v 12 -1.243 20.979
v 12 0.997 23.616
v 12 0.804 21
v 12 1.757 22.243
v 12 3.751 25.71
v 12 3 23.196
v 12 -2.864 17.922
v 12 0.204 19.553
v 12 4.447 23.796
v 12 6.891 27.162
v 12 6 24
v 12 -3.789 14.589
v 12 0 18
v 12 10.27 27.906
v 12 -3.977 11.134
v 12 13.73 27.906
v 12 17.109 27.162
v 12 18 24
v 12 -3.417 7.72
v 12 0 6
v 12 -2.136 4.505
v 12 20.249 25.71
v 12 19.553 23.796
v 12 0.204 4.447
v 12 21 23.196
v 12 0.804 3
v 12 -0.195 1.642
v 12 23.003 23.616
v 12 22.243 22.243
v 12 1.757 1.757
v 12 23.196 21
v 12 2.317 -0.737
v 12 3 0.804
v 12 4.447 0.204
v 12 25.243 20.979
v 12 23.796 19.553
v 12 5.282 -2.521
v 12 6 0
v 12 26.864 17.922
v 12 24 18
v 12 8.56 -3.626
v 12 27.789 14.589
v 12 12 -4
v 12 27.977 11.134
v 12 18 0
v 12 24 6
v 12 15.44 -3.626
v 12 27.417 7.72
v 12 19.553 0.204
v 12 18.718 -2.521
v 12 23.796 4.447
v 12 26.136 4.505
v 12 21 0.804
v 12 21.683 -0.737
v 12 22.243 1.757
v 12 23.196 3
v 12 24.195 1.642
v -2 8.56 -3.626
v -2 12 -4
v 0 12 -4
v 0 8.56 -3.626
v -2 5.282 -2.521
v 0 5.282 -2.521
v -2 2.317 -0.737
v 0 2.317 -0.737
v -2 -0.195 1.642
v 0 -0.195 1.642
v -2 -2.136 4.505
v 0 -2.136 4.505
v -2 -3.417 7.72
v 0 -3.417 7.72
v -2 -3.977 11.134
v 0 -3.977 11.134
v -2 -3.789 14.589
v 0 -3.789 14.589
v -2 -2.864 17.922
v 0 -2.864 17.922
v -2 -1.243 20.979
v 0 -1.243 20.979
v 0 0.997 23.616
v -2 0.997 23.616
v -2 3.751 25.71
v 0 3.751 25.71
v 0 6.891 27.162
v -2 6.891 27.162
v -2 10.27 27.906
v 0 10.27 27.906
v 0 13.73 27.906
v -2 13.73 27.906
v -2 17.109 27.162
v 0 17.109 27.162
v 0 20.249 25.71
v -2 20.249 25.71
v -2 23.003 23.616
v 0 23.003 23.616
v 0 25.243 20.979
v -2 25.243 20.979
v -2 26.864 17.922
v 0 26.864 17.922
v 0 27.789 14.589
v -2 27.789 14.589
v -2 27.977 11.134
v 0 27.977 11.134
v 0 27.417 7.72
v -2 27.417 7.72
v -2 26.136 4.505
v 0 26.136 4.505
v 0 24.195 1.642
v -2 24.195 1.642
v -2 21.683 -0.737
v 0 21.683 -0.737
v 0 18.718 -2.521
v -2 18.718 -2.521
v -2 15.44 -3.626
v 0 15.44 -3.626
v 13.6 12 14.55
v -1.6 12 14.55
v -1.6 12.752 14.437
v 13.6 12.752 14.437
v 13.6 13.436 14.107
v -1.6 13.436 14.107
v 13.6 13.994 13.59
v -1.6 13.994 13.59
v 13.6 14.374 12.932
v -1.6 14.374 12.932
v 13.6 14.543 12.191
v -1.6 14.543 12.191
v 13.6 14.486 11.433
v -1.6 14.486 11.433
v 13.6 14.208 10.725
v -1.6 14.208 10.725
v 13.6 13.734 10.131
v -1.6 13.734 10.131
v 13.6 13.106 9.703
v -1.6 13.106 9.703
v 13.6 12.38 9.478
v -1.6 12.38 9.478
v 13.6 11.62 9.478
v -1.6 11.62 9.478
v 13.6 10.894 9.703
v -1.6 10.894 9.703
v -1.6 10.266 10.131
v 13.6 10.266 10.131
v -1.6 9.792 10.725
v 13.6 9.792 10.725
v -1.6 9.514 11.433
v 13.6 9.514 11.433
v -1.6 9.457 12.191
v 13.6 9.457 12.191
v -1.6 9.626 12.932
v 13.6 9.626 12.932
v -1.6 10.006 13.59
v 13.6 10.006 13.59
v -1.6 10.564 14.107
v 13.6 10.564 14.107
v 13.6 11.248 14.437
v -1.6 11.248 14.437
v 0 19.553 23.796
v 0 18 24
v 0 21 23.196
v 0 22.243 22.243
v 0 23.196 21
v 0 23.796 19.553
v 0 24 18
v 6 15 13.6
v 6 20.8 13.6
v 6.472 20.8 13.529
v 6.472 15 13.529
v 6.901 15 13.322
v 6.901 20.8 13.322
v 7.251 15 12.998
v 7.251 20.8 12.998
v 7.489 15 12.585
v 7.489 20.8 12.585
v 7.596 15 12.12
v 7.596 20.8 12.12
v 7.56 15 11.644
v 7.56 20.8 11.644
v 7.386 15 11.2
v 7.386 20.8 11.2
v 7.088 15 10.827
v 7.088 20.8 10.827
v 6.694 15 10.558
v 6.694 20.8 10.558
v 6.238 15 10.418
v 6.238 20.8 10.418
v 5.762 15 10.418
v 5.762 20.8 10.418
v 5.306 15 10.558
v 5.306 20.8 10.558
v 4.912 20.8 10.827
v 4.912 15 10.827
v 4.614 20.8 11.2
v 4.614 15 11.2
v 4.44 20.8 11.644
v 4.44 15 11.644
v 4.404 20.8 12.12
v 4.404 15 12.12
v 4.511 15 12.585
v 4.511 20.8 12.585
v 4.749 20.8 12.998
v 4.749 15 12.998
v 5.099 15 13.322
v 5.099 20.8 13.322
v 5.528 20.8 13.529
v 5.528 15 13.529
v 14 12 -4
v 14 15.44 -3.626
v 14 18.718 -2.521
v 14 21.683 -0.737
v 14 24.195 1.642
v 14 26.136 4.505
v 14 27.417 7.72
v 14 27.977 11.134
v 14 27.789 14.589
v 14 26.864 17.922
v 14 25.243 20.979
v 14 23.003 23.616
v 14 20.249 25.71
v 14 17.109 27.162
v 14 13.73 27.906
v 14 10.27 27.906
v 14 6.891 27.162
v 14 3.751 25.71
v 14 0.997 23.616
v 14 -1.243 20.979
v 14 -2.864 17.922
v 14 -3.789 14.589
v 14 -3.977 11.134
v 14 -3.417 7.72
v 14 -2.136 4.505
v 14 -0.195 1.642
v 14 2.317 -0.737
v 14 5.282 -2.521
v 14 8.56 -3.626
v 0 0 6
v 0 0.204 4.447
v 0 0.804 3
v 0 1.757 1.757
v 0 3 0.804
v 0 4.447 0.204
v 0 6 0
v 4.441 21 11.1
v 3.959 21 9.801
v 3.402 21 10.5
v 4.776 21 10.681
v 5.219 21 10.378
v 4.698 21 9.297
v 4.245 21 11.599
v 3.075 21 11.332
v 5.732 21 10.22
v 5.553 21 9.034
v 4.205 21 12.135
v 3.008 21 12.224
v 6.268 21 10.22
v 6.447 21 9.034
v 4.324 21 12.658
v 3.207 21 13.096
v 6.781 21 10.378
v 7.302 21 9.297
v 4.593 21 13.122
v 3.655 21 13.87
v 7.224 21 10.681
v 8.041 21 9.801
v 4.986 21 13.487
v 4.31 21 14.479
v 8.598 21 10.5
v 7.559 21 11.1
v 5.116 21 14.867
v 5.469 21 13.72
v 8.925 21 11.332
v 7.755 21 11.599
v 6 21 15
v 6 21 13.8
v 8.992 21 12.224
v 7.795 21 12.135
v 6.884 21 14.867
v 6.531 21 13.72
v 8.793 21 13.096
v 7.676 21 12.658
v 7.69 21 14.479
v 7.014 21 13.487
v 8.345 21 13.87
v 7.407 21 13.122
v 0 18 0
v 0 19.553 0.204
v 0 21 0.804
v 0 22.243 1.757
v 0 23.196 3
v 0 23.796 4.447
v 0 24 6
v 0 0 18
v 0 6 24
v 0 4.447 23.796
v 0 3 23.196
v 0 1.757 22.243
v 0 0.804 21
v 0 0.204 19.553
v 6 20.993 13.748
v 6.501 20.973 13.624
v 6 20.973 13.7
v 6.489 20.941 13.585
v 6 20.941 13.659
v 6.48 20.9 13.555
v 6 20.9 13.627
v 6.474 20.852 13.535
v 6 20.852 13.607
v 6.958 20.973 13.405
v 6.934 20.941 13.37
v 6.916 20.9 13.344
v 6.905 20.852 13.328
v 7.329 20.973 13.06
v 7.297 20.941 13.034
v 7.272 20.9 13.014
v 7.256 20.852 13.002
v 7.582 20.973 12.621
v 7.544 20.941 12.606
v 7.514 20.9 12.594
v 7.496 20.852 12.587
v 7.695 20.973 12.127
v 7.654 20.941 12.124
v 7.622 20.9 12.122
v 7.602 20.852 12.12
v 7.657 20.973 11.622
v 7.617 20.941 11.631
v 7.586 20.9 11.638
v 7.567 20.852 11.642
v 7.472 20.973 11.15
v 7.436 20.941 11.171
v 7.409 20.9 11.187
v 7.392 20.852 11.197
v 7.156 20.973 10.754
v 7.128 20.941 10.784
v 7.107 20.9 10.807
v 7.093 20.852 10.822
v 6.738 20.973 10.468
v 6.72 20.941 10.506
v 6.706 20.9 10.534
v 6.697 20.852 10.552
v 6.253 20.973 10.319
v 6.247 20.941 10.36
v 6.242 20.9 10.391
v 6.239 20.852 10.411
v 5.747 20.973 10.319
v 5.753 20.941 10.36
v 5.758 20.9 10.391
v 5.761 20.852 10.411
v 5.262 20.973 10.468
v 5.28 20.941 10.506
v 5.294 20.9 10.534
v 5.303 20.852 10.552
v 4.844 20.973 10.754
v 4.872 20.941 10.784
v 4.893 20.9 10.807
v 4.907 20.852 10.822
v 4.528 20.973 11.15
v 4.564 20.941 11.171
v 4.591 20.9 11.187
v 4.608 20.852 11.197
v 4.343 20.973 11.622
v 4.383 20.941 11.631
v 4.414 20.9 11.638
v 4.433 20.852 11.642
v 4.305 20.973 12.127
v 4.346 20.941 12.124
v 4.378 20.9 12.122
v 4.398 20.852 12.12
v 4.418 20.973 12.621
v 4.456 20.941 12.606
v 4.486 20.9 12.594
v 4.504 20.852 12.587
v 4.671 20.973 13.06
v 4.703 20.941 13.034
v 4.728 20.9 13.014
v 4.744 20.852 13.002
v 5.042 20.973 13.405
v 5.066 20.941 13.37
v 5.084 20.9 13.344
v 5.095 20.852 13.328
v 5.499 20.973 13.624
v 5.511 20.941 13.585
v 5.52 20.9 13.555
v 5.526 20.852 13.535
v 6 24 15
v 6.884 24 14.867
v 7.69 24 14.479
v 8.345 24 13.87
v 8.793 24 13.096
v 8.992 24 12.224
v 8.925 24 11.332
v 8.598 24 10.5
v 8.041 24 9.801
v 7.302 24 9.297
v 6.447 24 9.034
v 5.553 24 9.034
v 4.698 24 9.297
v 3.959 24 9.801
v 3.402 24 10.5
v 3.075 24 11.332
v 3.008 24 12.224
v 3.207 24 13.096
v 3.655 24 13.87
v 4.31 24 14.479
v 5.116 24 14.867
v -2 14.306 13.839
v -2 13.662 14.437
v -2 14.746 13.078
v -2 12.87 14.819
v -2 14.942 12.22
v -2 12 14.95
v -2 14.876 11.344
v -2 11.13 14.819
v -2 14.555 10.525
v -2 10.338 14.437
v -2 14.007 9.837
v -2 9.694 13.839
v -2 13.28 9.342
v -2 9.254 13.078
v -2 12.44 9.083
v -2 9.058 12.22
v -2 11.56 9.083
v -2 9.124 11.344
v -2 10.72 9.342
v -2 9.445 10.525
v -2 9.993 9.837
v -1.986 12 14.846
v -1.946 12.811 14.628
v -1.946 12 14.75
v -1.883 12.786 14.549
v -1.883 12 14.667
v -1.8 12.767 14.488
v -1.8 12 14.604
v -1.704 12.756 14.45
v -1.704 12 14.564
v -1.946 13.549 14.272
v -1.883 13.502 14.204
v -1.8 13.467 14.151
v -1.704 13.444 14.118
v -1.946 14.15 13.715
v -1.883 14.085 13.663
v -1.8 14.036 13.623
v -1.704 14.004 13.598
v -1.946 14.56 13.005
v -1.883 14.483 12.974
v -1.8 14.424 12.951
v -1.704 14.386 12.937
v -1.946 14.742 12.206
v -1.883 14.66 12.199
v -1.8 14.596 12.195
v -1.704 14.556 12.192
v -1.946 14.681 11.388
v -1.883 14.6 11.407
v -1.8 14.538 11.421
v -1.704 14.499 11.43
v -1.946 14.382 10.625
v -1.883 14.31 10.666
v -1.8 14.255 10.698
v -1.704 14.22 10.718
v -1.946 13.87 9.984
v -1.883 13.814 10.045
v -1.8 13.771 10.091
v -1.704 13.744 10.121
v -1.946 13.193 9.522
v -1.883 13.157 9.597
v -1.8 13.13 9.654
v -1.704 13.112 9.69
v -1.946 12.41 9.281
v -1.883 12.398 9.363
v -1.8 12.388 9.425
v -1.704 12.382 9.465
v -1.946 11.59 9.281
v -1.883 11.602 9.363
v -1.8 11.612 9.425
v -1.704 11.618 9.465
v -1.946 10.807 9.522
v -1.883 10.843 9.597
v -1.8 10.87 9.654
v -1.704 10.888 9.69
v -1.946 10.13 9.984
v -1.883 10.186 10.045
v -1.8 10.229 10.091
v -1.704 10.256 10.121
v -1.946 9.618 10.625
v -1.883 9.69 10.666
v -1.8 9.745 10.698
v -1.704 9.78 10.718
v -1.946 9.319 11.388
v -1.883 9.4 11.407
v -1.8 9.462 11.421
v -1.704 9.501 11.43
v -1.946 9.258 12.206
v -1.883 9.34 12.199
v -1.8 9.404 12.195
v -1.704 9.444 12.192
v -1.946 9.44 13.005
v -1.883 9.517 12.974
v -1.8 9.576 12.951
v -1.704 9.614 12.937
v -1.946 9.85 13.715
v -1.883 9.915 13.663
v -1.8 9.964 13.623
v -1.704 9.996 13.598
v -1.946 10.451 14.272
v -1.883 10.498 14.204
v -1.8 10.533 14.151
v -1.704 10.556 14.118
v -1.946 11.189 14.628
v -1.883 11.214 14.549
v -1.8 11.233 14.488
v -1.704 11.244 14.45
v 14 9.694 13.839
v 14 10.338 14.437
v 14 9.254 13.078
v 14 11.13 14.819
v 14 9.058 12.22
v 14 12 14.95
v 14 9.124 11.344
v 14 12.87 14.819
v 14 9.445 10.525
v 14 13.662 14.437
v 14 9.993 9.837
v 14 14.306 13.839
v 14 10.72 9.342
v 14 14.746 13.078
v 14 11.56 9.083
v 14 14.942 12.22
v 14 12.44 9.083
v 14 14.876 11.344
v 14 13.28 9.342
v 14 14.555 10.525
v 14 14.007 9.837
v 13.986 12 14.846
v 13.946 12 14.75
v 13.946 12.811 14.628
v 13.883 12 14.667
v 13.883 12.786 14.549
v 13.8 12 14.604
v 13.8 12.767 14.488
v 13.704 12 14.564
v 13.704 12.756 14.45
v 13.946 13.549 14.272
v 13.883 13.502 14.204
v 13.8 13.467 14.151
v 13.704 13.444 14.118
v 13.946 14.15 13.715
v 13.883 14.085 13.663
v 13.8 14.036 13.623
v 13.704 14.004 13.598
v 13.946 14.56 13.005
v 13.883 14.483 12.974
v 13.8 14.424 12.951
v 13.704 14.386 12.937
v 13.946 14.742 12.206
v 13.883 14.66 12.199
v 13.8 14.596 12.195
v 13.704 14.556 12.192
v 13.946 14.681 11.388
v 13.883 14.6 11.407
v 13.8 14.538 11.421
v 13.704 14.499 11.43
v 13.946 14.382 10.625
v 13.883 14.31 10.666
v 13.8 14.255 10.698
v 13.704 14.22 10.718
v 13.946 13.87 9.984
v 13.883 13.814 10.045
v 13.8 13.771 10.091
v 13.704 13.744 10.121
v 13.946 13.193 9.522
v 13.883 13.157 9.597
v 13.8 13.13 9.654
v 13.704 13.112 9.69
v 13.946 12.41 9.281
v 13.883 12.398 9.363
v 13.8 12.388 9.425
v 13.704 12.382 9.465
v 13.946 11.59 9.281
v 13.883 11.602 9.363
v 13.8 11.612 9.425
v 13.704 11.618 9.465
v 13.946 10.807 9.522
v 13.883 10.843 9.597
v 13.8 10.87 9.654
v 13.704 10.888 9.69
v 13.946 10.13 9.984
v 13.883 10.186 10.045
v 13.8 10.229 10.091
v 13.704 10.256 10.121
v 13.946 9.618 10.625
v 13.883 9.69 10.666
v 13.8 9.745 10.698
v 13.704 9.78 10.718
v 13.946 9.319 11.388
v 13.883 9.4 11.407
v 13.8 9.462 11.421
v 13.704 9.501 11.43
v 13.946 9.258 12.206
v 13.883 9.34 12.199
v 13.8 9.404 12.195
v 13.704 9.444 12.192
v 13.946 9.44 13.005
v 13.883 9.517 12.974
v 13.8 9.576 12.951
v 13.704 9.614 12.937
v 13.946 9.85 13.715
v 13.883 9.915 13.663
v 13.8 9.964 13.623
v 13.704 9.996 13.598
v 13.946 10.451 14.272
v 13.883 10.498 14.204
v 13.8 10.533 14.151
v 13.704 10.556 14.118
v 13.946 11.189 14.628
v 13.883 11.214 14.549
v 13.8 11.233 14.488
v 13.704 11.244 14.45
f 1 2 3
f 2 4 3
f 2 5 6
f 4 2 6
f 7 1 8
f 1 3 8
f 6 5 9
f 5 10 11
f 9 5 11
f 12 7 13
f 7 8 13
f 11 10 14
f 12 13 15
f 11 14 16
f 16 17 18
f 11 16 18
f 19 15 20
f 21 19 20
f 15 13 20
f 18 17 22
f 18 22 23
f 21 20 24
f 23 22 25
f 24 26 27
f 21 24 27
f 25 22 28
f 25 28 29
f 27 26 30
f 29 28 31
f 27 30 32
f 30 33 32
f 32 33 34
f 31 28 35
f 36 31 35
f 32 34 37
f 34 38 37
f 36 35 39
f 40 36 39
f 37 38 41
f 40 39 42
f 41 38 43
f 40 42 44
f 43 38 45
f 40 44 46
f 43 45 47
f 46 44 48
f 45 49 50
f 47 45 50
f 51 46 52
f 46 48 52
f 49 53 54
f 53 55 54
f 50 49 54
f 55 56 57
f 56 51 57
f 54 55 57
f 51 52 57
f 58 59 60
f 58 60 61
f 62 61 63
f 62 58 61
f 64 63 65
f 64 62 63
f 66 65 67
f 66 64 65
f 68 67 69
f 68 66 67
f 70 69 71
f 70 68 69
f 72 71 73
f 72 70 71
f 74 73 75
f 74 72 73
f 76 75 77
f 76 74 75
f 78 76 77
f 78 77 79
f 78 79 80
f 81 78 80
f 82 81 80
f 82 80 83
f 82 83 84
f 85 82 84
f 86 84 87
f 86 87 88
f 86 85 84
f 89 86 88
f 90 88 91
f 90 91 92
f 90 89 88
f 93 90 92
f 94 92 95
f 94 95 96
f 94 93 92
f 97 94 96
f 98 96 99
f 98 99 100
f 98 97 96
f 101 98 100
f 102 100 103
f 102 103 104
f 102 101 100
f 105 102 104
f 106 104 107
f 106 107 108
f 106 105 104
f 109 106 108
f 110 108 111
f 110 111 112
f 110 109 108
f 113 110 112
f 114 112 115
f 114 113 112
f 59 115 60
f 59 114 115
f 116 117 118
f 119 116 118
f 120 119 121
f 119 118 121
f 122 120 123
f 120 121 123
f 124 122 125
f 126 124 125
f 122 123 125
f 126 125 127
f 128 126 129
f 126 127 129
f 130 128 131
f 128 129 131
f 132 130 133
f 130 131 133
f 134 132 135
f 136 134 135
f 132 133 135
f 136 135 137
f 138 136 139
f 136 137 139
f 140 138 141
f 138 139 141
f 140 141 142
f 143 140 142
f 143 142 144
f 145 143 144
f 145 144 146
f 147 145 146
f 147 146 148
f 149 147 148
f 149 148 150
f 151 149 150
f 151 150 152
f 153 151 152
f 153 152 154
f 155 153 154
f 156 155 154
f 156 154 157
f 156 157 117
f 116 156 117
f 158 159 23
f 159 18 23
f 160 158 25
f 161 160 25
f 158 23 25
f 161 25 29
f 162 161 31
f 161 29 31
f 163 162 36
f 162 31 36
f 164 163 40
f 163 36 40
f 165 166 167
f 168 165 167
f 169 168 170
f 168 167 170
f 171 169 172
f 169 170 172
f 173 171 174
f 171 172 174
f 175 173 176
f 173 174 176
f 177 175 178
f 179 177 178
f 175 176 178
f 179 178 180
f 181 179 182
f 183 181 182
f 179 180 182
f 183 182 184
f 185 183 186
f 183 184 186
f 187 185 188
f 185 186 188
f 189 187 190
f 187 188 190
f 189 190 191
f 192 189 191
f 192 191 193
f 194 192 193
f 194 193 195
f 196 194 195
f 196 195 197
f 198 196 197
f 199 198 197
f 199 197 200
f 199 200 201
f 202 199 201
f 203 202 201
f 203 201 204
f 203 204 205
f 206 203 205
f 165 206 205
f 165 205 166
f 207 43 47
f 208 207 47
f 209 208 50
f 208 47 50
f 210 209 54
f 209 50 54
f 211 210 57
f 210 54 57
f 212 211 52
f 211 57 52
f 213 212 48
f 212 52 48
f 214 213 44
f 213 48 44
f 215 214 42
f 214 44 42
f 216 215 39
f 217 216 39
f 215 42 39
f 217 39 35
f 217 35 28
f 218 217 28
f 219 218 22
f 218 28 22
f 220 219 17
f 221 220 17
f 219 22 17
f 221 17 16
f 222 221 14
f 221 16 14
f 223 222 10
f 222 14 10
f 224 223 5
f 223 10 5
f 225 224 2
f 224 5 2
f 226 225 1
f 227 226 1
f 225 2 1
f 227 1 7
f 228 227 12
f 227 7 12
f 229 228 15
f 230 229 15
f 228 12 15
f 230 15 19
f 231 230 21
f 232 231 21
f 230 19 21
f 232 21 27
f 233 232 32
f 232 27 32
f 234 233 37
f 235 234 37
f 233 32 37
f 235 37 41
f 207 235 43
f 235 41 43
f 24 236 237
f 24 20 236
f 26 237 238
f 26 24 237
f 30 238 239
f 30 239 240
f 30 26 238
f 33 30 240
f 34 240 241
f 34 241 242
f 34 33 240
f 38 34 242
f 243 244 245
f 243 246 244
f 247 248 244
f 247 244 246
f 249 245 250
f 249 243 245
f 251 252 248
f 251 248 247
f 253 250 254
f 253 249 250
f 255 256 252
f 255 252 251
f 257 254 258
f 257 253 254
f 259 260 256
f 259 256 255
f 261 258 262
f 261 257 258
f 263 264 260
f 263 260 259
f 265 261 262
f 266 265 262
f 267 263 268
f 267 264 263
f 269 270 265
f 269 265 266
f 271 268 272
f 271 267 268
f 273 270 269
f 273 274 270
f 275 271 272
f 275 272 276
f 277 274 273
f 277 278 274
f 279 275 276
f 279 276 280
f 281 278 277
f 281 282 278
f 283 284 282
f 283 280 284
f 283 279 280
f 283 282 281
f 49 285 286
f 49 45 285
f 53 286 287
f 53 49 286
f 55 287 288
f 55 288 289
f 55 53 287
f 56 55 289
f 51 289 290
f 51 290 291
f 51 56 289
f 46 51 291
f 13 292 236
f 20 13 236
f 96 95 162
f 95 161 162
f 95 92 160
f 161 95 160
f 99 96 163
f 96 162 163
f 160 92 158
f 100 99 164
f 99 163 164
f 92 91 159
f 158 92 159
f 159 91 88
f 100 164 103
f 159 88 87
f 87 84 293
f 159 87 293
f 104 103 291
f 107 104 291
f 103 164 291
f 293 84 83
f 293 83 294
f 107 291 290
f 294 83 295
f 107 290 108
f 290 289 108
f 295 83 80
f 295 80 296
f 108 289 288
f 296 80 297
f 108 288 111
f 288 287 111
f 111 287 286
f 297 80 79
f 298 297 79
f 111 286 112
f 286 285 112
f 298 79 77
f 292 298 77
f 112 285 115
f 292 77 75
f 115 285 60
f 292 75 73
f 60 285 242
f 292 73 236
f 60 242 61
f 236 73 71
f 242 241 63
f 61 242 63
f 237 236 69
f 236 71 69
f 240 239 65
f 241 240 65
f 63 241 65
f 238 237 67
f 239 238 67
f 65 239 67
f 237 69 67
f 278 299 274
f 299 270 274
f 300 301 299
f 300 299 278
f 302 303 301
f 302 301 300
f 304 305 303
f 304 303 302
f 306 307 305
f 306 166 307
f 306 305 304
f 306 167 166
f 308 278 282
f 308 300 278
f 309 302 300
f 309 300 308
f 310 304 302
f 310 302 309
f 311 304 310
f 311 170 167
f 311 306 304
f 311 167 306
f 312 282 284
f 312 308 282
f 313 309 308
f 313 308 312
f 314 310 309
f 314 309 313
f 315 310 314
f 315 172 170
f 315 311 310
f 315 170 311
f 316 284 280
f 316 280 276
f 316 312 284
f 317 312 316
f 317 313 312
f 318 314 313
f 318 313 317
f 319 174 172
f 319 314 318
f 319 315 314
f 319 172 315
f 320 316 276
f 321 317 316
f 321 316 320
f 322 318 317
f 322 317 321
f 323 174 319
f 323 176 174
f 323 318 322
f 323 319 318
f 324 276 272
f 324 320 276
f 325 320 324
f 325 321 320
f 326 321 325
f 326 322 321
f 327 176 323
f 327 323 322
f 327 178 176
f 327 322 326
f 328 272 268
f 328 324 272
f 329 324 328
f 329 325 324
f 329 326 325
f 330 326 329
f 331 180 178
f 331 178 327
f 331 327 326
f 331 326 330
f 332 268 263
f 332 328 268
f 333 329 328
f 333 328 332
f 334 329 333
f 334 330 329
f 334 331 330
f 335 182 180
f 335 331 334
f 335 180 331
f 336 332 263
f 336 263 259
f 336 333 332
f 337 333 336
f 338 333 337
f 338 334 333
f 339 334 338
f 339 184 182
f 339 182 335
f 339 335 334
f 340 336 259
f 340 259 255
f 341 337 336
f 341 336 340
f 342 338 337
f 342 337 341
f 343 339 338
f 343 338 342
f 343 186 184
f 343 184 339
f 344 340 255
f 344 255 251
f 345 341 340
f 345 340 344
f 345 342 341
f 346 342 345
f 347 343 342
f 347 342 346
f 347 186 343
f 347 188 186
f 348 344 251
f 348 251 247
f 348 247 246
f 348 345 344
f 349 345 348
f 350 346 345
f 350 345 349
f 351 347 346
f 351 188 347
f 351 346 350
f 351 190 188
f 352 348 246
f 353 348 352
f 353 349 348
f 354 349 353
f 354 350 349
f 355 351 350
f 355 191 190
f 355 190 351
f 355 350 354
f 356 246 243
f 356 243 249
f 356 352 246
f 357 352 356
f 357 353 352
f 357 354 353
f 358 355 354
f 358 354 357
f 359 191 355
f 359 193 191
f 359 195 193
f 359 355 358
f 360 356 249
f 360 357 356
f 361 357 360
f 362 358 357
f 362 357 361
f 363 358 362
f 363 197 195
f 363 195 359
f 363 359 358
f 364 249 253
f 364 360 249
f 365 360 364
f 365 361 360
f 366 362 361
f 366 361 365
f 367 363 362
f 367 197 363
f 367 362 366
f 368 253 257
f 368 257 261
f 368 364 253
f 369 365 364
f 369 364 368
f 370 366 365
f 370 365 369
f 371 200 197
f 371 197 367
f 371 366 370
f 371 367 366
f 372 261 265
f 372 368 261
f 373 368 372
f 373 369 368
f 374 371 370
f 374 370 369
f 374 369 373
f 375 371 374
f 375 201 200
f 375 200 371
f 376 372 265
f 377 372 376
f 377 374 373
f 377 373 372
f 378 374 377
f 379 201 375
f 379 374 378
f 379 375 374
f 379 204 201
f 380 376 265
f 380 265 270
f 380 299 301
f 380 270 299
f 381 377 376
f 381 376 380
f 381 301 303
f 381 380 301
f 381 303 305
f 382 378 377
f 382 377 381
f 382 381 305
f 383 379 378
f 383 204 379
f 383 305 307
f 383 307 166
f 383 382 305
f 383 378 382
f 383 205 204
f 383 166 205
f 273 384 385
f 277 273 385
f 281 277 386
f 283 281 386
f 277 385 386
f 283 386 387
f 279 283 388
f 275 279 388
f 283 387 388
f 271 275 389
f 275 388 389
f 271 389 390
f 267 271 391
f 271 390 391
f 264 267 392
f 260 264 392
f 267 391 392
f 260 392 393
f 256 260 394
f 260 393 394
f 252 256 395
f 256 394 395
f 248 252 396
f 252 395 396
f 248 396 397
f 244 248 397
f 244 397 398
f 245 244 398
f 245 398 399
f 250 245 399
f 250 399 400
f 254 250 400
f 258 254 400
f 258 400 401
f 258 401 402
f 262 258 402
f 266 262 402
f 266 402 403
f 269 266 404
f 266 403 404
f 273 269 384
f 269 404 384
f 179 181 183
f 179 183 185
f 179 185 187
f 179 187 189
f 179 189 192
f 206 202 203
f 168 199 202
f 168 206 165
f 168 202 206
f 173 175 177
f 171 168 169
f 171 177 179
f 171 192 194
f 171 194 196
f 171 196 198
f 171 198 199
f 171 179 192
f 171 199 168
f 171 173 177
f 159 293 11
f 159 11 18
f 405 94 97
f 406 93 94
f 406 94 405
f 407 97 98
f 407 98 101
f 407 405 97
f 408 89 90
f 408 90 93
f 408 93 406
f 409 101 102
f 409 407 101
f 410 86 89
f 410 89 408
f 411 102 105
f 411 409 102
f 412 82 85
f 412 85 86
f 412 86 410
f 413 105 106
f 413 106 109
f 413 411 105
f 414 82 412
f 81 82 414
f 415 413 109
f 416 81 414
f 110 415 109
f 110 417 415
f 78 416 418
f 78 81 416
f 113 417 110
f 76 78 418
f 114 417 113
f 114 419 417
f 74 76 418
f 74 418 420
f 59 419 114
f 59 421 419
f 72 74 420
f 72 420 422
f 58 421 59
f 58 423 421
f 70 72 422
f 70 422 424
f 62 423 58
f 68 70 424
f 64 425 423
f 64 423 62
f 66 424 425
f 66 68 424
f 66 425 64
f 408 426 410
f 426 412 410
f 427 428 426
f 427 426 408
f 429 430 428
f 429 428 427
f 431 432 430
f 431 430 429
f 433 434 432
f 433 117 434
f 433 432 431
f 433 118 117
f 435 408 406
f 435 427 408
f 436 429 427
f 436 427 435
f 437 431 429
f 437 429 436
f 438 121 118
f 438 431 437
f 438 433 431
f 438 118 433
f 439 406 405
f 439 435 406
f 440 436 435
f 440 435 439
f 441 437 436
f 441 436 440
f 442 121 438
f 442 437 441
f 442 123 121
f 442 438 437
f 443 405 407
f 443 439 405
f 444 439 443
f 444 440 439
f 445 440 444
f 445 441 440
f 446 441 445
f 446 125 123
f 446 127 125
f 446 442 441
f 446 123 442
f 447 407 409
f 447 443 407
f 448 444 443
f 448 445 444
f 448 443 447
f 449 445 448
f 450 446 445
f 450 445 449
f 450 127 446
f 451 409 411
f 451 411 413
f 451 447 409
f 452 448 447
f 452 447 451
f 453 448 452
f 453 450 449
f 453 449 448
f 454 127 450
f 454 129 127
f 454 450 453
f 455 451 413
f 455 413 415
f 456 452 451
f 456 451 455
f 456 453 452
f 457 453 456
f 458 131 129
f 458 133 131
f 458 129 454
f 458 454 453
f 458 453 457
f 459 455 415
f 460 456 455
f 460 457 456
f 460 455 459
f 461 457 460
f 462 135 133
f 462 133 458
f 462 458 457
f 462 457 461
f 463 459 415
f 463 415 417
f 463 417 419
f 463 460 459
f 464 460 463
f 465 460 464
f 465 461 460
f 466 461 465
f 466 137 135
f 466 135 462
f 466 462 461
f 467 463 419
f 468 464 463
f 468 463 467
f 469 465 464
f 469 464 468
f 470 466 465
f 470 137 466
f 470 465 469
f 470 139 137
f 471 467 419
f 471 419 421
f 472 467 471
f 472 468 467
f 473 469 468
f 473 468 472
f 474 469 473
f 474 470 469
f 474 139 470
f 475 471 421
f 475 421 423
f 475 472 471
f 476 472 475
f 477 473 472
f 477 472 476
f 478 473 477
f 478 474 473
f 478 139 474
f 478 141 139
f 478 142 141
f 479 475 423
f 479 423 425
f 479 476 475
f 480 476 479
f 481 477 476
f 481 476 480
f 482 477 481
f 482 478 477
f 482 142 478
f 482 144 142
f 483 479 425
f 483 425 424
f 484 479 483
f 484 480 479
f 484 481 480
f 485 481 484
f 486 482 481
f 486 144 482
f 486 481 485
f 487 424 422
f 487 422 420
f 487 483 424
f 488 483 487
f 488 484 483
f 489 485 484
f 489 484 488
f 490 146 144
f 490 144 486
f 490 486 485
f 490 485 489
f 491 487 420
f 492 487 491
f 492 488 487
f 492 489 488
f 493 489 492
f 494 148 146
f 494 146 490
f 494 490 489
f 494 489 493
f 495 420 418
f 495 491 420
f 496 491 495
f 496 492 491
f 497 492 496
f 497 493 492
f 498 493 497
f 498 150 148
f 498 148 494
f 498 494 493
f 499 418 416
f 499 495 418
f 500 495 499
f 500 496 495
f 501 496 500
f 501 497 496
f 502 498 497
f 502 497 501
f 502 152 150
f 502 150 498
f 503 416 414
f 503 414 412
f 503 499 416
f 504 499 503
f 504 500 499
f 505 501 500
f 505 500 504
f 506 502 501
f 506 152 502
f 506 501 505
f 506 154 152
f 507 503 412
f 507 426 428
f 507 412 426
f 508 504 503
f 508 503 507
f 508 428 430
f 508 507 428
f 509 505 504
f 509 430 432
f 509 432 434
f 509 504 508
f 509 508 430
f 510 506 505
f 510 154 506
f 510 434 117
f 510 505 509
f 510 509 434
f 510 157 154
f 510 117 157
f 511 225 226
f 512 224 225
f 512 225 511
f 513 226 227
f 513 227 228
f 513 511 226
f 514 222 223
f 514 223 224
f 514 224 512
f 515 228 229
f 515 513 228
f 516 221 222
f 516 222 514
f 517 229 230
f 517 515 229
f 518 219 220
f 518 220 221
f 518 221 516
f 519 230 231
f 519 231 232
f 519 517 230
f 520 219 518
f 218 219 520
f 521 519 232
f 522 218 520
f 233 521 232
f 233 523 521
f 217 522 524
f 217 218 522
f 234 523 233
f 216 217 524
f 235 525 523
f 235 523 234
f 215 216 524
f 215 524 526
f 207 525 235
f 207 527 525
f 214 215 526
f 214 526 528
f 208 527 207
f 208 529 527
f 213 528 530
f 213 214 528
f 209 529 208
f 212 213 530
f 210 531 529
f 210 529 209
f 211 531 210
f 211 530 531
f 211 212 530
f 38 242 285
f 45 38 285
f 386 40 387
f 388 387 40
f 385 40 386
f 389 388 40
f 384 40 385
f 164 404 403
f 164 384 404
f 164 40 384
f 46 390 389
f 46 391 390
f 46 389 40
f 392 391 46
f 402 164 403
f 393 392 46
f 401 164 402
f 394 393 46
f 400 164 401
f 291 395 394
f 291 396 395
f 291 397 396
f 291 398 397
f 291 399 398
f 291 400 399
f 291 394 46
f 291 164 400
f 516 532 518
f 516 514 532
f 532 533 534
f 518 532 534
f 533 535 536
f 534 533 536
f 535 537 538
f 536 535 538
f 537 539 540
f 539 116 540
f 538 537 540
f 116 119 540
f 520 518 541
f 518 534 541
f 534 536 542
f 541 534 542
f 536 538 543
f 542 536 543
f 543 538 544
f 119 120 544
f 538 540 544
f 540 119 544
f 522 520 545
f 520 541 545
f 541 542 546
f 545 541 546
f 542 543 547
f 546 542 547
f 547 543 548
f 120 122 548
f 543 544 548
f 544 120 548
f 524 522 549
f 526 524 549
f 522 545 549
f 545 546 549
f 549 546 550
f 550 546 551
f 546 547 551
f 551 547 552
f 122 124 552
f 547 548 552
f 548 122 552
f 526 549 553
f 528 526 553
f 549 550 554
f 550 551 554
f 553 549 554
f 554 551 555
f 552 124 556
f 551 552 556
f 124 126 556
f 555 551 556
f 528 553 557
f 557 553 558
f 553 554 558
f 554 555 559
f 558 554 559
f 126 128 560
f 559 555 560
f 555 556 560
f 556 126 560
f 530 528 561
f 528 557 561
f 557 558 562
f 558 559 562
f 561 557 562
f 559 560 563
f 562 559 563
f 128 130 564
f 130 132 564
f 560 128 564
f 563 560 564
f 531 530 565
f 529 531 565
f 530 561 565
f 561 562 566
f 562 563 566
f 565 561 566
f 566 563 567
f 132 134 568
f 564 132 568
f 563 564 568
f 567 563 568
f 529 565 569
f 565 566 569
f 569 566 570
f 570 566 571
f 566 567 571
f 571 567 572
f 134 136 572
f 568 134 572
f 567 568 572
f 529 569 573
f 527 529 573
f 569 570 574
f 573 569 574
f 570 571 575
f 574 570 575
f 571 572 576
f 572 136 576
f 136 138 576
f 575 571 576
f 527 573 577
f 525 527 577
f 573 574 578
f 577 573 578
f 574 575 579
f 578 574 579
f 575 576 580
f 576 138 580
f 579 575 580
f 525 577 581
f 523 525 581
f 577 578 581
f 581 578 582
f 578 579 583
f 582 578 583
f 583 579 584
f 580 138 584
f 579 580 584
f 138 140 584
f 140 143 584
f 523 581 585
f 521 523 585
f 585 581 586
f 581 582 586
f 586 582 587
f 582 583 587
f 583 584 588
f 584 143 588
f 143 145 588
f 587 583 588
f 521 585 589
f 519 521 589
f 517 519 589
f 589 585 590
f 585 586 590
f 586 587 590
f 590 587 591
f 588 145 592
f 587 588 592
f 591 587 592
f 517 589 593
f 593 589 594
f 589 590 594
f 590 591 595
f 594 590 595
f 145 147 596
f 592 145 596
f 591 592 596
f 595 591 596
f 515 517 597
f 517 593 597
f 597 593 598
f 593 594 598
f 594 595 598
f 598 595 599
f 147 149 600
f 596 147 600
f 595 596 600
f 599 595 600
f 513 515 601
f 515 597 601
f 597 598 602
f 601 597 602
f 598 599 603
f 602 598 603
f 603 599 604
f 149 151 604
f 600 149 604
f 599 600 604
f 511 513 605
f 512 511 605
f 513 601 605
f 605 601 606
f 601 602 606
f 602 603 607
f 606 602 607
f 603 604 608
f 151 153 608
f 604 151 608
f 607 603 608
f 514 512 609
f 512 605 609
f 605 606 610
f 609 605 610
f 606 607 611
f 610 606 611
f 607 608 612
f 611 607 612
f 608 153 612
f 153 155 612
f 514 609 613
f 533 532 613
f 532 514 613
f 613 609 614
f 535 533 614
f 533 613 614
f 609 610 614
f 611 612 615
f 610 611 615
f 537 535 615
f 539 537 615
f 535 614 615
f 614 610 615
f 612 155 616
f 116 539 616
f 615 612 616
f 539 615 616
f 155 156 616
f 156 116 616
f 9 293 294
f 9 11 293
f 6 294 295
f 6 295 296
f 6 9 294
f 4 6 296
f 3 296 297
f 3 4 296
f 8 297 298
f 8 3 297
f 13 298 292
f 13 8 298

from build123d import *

# Parameters (mm, degrees)
SKETCH_1_W          = 24
SKETCH_1_H          = 24
EXTRUDE_1_DEPTH     = 12
FILLET_1_R          = 6
SKETCH_3_R          = 1.6
CUT_EXTRUDE_1_DEPTH = 9
SKETCH_4_R          = 3
CUT_EXTRUDE_2_DEPTH = 3
SKETCH_5_R          = 1.55
CUT_EXTRUDE_3_DEPTH = 23
SKETCH_7_R          = 16
EXTRUDE_2_DEPTH     = 2
EXTRUDE_START       = 2
SKETCH_8_R          = 16
EXTRUDE_3_DEPTH     = 2
SKETCH_9_R          = 2.55
CUT_EXTRUDE_4_DEPTH = 22
FILLET_2_R          = 0.2
FILLET_3_R          = 0.4


with BuildPart() as part:
    # 草图1 → 凸台-拉伸1 (new body)
    with BuildSketch(Plane(origin=(0, 0, 0), x_dir=(0, 0, -1), z_dir=(1, 0, 0))):
        with Locations((-12, 12)):
            Rectangle(SKETCH_1_W, SKETCH_1_H)
    extrude(amount=EXTRUDE_1_DEPTH)

    # 圆角1
    fillet_1_edges = [part.edges().sort_by_distance(p)[0] for p in [
        (6, 0, 0),
        (6, 0, 24),
        (6, 24, 24),
        (6, 24, 0),
    ]]
    fillet(fillet_1_edges, radius=FILLET_1_R)

    # 草图3 → 切除-拉伸1 (cut)
    with BuildSketch(Plane(origin=(0, 24, 0), x_dir=(1, 0, 0), z_dir=(0, 1, 0))):
        with Locations(Location((6, -12, 0), (0, 0, 270))):
            Circle(SKETCH_3_R)
    extrude(amount=-CUT_EXTRUDE_1_DEPTH, mode=Mode.SUBTRACT)

    # 草图4 → 切除-拉伸2 (cut)
    with BuildSketch(Plane(origin=(0, 24, 0), x_dir=(1, 0, 0), z_dir=(0, 1, 0))):
        with Locations(Location((6, -12, 0), (0, 0, 270))):
            Circle(SKETCH_4_R)
    extrude(amount=-CUT_EXTRUDE_2_DEPTH, mode=Mode.SUBTRACT)

    # 草图5 → 切除-拉伸3 (cut)
    with BuildSketch(Plane.ZY):
        with Locations((12, 12)):
            Circle(SKETCH_5_R)
    extrude(amount=-CUT_EXTRUDE_3_DEPTH, mode=Mode.SUBTRACT)

    # 草图7 → 凸台-拉伸2 (add)
    with BuildSketch(Plane(origin=(12, 0, 0), x_dir=(0, 0, -1), z_dir=(1, 0, 0))):
        with Locations((-12, 12)):
            Circle(SKETCH_7_R)
    extrude(amount=EXTRUDE_2_DEPTH)

    # 草图8 → 凸台-拉伸3 (add)
    with BuildSketch(Plane.ZY.offset(EXTRUDE_START)):
        with Locations(Location((12, 12, 0), (0, 0, 180))):
            Circle(SKETCH_8_R)
    extrude(amount=-EXTRUDE_3_DEPTH)

    # 草图9 → 切除-拉伸4 (cut)
    with BuildSketch(Plane.ZY.offset(2)):
        with Locations((12, 12)):
            Circle(SKETCH_9_R)
    extrude(amount=-CUT_EXTRUDE_4_DEPTH, mode=Mode.SUBTRACT)

    # 圆角2
    fillet_2_edges = [part.edges().sort_by_distance(p)[0] for p in [
        (6, 21, 10.4),
    ]]
    fillet(fillet_2_edges, radius=FILLET_2_R)

    # 圆角3
    fillet_3_edges = [part.edges().sort_by_distance(p)[0] for p in [
        (14, 12, 9.45),
        (-2, 12, 9.45),
    ]]
    fillet(fillet_3_edges, radius=FILLET_3_R)


solid = part.part
